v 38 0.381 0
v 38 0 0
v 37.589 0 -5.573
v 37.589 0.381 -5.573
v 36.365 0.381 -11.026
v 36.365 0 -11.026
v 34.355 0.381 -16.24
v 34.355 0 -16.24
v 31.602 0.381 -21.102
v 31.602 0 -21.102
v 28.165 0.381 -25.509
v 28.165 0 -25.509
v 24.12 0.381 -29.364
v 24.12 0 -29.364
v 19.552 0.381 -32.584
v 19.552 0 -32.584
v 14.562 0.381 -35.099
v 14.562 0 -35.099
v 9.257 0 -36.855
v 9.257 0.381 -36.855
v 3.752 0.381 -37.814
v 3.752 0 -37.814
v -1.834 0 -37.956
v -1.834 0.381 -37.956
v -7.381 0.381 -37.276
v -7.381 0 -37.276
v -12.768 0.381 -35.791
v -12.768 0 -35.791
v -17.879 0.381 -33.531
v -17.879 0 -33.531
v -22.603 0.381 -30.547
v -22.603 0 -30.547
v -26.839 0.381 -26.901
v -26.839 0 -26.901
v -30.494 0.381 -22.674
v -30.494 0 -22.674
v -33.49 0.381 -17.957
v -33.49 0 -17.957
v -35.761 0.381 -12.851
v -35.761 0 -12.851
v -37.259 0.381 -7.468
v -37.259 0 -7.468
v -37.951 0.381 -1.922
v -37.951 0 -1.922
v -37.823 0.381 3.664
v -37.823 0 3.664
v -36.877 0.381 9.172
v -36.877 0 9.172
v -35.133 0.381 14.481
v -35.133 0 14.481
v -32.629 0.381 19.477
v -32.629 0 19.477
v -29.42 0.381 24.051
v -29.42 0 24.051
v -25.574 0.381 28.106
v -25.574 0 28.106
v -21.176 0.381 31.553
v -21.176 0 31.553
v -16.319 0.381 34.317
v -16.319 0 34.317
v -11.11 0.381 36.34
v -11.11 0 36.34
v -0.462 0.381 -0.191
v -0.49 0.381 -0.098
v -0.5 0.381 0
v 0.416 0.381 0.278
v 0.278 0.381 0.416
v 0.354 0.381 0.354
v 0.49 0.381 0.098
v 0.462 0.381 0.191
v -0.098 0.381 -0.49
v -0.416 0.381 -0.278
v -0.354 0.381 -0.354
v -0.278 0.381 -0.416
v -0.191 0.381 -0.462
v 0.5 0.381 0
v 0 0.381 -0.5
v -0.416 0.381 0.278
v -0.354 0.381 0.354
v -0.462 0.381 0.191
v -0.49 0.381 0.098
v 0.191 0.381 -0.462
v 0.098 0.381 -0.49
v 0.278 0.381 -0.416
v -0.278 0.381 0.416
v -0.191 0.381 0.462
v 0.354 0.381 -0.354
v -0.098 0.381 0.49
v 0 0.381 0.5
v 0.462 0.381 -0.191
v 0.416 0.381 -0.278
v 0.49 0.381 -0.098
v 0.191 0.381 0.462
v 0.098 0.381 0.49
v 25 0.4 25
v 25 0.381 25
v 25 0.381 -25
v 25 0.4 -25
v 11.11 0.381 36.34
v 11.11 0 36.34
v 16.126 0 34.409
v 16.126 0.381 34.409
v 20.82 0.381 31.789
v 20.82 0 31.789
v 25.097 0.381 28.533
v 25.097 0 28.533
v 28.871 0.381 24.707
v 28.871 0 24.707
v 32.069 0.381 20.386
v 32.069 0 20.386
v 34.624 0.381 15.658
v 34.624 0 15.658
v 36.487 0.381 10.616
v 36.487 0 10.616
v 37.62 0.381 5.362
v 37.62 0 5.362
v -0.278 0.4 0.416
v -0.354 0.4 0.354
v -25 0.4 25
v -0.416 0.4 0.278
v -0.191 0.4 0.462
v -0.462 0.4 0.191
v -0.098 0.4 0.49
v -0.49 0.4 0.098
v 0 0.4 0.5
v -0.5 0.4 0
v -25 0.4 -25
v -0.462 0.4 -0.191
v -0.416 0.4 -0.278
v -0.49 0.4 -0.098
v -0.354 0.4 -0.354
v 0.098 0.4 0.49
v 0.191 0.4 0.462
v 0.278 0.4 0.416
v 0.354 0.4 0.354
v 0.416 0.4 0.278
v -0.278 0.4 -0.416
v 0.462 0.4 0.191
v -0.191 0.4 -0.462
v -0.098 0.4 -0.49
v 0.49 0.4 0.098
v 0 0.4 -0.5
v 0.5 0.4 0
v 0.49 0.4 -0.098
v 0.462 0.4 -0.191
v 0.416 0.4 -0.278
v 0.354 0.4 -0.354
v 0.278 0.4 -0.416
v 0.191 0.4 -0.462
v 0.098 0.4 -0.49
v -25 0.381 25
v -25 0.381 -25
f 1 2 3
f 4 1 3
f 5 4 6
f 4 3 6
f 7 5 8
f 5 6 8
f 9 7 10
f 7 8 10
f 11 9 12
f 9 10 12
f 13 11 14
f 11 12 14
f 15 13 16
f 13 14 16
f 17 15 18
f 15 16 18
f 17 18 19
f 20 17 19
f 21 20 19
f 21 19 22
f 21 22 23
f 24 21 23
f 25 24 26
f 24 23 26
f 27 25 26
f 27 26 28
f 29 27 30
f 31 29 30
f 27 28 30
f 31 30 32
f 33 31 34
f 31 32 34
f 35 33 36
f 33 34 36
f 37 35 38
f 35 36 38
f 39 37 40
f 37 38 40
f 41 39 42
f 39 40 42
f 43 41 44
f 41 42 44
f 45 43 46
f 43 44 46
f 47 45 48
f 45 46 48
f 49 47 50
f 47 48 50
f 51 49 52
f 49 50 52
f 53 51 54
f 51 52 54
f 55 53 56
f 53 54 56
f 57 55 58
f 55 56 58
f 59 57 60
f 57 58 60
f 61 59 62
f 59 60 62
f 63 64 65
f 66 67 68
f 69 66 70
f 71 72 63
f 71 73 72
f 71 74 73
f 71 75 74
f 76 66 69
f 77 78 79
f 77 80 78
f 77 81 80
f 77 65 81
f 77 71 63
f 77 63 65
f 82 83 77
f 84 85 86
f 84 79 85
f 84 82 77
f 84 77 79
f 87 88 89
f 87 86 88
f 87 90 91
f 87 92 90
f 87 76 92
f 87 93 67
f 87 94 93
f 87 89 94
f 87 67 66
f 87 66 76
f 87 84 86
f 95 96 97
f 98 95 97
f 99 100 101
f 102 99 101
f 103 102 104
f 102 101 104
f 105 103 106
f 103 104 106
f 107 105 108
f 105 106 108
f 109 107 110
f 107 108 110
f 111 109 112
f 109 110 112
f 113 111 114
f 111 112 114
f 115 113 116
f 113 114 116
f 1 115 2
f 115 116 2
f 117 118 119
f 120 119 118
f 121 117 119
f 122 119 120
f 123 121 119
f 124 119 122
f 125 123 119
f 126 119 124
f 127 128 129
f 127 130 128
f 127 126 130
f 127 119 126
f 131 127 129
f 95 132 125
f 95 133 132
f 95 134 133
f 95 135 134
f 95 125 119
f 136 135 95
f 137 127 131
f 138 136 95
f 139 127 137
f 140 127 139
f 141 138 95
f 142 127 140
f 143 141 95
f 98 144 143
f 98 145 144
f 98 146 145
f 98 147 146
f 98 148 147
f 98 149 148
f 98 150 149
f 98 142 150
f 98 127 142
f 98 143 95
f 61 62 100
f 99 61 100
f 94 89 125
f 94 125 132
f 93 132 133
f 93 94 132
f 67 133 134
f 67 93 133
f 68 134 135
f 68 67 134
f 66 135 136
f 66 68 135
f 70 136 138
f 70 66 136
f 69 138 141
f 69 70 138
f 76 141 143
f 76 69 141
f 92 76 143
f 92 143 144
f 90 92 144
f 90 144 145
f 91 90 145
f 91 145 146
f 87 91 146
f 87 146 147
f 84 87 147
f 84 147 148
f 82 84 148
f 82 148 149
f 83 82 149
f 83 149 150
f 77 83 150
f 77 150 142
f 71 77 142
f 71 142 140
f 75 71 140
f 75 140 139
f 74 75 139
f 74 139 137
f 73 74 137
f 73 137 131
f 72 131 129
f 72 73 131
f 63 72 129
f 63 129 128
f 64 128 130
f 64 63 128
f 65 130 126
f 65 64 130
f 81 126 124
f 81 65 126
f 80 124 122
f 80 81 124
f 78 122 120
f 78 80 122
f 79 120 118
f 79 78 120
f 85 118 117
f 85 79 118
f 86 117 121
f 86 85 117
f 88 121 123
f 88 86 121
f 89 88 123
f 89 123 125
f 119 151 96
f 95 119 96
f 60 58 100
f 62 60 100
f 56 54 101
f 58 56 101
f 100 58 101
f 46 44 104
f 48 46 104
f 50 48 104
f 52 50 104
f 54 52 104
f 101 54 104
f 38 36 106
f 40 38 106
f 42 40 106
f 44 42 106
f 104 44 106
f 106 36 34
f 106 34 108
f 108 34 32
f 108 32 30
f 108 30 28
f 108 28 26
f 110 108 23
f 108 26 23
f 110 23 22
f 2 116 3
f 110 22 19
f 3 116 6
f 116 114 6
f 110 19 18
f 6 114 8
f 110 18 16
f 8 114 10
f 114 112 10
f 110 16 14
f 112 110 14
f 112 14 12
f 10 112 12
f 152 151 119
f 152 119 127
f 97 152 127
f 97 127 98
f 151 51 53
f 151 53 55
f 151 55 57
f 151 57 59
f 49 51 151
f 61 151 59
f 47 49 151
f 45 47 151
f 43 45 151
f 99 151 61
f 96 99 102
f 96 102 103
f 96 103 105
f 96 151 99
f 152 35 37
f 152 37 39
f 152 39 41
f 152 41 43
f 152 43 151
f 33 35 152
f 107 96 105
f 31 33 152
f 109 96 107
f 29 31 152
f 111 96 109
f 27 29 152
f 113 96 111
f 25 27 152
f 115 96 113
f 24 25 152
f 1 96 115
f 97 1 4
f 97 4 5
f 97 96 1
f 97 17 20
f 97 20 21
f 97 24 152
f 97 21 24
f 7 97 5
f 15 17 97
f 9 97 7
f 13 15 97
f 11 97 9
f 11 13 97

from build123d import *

# Parameters (mm, degrees)
SKETCH1_W           = 50
SKETCH1_H           = 50
SKETCH1_R           = 0.5
BOSS_EXTRUDE1_DEPTH = 0.4
BOSS_EXTRUDE2_DEPTH = 0.381


with BuildPart() as part:
    # Sketch1 → Boss-Extrude1 (new body)
    with BuildSketch(Plane(origin=(0, 0, 0), x_dir=(1, 0, 0), z_dir=(0, 1, 0))):
        Rectangle(SKETCH1_W, SKETCH1_H)
        with Locations(Location((0, 0, 0), (0, 0, 270))):
            Circle(SKETCH1_R, mode=Mode.SUBTRACT)
    extrude(amount=BOSS_EXTRUDE1_DEPTH)

    # Sketch3 → Boss-Extrude2 (add)
    with BuildSketch(Plane(origin=(0, 0, 0), x_dir=(1, 0, 0), z_dir=(0, 1, 0))):
        with BuildLine():
            ThreePointArc((38, 0), (-22.60331834, 30.546521897), (-11.11, -36.339618875))
            Line((-11.11, -36.339618875), (11.11, -36.339618875))
            ThreePointArc((11.11, -36.339618875), (30.546521897, -22.60331834), (38, 0))
        make_face()
    extrude(amount=BOSS_EXTRUDE2_DEPTH)


solid = part.part
